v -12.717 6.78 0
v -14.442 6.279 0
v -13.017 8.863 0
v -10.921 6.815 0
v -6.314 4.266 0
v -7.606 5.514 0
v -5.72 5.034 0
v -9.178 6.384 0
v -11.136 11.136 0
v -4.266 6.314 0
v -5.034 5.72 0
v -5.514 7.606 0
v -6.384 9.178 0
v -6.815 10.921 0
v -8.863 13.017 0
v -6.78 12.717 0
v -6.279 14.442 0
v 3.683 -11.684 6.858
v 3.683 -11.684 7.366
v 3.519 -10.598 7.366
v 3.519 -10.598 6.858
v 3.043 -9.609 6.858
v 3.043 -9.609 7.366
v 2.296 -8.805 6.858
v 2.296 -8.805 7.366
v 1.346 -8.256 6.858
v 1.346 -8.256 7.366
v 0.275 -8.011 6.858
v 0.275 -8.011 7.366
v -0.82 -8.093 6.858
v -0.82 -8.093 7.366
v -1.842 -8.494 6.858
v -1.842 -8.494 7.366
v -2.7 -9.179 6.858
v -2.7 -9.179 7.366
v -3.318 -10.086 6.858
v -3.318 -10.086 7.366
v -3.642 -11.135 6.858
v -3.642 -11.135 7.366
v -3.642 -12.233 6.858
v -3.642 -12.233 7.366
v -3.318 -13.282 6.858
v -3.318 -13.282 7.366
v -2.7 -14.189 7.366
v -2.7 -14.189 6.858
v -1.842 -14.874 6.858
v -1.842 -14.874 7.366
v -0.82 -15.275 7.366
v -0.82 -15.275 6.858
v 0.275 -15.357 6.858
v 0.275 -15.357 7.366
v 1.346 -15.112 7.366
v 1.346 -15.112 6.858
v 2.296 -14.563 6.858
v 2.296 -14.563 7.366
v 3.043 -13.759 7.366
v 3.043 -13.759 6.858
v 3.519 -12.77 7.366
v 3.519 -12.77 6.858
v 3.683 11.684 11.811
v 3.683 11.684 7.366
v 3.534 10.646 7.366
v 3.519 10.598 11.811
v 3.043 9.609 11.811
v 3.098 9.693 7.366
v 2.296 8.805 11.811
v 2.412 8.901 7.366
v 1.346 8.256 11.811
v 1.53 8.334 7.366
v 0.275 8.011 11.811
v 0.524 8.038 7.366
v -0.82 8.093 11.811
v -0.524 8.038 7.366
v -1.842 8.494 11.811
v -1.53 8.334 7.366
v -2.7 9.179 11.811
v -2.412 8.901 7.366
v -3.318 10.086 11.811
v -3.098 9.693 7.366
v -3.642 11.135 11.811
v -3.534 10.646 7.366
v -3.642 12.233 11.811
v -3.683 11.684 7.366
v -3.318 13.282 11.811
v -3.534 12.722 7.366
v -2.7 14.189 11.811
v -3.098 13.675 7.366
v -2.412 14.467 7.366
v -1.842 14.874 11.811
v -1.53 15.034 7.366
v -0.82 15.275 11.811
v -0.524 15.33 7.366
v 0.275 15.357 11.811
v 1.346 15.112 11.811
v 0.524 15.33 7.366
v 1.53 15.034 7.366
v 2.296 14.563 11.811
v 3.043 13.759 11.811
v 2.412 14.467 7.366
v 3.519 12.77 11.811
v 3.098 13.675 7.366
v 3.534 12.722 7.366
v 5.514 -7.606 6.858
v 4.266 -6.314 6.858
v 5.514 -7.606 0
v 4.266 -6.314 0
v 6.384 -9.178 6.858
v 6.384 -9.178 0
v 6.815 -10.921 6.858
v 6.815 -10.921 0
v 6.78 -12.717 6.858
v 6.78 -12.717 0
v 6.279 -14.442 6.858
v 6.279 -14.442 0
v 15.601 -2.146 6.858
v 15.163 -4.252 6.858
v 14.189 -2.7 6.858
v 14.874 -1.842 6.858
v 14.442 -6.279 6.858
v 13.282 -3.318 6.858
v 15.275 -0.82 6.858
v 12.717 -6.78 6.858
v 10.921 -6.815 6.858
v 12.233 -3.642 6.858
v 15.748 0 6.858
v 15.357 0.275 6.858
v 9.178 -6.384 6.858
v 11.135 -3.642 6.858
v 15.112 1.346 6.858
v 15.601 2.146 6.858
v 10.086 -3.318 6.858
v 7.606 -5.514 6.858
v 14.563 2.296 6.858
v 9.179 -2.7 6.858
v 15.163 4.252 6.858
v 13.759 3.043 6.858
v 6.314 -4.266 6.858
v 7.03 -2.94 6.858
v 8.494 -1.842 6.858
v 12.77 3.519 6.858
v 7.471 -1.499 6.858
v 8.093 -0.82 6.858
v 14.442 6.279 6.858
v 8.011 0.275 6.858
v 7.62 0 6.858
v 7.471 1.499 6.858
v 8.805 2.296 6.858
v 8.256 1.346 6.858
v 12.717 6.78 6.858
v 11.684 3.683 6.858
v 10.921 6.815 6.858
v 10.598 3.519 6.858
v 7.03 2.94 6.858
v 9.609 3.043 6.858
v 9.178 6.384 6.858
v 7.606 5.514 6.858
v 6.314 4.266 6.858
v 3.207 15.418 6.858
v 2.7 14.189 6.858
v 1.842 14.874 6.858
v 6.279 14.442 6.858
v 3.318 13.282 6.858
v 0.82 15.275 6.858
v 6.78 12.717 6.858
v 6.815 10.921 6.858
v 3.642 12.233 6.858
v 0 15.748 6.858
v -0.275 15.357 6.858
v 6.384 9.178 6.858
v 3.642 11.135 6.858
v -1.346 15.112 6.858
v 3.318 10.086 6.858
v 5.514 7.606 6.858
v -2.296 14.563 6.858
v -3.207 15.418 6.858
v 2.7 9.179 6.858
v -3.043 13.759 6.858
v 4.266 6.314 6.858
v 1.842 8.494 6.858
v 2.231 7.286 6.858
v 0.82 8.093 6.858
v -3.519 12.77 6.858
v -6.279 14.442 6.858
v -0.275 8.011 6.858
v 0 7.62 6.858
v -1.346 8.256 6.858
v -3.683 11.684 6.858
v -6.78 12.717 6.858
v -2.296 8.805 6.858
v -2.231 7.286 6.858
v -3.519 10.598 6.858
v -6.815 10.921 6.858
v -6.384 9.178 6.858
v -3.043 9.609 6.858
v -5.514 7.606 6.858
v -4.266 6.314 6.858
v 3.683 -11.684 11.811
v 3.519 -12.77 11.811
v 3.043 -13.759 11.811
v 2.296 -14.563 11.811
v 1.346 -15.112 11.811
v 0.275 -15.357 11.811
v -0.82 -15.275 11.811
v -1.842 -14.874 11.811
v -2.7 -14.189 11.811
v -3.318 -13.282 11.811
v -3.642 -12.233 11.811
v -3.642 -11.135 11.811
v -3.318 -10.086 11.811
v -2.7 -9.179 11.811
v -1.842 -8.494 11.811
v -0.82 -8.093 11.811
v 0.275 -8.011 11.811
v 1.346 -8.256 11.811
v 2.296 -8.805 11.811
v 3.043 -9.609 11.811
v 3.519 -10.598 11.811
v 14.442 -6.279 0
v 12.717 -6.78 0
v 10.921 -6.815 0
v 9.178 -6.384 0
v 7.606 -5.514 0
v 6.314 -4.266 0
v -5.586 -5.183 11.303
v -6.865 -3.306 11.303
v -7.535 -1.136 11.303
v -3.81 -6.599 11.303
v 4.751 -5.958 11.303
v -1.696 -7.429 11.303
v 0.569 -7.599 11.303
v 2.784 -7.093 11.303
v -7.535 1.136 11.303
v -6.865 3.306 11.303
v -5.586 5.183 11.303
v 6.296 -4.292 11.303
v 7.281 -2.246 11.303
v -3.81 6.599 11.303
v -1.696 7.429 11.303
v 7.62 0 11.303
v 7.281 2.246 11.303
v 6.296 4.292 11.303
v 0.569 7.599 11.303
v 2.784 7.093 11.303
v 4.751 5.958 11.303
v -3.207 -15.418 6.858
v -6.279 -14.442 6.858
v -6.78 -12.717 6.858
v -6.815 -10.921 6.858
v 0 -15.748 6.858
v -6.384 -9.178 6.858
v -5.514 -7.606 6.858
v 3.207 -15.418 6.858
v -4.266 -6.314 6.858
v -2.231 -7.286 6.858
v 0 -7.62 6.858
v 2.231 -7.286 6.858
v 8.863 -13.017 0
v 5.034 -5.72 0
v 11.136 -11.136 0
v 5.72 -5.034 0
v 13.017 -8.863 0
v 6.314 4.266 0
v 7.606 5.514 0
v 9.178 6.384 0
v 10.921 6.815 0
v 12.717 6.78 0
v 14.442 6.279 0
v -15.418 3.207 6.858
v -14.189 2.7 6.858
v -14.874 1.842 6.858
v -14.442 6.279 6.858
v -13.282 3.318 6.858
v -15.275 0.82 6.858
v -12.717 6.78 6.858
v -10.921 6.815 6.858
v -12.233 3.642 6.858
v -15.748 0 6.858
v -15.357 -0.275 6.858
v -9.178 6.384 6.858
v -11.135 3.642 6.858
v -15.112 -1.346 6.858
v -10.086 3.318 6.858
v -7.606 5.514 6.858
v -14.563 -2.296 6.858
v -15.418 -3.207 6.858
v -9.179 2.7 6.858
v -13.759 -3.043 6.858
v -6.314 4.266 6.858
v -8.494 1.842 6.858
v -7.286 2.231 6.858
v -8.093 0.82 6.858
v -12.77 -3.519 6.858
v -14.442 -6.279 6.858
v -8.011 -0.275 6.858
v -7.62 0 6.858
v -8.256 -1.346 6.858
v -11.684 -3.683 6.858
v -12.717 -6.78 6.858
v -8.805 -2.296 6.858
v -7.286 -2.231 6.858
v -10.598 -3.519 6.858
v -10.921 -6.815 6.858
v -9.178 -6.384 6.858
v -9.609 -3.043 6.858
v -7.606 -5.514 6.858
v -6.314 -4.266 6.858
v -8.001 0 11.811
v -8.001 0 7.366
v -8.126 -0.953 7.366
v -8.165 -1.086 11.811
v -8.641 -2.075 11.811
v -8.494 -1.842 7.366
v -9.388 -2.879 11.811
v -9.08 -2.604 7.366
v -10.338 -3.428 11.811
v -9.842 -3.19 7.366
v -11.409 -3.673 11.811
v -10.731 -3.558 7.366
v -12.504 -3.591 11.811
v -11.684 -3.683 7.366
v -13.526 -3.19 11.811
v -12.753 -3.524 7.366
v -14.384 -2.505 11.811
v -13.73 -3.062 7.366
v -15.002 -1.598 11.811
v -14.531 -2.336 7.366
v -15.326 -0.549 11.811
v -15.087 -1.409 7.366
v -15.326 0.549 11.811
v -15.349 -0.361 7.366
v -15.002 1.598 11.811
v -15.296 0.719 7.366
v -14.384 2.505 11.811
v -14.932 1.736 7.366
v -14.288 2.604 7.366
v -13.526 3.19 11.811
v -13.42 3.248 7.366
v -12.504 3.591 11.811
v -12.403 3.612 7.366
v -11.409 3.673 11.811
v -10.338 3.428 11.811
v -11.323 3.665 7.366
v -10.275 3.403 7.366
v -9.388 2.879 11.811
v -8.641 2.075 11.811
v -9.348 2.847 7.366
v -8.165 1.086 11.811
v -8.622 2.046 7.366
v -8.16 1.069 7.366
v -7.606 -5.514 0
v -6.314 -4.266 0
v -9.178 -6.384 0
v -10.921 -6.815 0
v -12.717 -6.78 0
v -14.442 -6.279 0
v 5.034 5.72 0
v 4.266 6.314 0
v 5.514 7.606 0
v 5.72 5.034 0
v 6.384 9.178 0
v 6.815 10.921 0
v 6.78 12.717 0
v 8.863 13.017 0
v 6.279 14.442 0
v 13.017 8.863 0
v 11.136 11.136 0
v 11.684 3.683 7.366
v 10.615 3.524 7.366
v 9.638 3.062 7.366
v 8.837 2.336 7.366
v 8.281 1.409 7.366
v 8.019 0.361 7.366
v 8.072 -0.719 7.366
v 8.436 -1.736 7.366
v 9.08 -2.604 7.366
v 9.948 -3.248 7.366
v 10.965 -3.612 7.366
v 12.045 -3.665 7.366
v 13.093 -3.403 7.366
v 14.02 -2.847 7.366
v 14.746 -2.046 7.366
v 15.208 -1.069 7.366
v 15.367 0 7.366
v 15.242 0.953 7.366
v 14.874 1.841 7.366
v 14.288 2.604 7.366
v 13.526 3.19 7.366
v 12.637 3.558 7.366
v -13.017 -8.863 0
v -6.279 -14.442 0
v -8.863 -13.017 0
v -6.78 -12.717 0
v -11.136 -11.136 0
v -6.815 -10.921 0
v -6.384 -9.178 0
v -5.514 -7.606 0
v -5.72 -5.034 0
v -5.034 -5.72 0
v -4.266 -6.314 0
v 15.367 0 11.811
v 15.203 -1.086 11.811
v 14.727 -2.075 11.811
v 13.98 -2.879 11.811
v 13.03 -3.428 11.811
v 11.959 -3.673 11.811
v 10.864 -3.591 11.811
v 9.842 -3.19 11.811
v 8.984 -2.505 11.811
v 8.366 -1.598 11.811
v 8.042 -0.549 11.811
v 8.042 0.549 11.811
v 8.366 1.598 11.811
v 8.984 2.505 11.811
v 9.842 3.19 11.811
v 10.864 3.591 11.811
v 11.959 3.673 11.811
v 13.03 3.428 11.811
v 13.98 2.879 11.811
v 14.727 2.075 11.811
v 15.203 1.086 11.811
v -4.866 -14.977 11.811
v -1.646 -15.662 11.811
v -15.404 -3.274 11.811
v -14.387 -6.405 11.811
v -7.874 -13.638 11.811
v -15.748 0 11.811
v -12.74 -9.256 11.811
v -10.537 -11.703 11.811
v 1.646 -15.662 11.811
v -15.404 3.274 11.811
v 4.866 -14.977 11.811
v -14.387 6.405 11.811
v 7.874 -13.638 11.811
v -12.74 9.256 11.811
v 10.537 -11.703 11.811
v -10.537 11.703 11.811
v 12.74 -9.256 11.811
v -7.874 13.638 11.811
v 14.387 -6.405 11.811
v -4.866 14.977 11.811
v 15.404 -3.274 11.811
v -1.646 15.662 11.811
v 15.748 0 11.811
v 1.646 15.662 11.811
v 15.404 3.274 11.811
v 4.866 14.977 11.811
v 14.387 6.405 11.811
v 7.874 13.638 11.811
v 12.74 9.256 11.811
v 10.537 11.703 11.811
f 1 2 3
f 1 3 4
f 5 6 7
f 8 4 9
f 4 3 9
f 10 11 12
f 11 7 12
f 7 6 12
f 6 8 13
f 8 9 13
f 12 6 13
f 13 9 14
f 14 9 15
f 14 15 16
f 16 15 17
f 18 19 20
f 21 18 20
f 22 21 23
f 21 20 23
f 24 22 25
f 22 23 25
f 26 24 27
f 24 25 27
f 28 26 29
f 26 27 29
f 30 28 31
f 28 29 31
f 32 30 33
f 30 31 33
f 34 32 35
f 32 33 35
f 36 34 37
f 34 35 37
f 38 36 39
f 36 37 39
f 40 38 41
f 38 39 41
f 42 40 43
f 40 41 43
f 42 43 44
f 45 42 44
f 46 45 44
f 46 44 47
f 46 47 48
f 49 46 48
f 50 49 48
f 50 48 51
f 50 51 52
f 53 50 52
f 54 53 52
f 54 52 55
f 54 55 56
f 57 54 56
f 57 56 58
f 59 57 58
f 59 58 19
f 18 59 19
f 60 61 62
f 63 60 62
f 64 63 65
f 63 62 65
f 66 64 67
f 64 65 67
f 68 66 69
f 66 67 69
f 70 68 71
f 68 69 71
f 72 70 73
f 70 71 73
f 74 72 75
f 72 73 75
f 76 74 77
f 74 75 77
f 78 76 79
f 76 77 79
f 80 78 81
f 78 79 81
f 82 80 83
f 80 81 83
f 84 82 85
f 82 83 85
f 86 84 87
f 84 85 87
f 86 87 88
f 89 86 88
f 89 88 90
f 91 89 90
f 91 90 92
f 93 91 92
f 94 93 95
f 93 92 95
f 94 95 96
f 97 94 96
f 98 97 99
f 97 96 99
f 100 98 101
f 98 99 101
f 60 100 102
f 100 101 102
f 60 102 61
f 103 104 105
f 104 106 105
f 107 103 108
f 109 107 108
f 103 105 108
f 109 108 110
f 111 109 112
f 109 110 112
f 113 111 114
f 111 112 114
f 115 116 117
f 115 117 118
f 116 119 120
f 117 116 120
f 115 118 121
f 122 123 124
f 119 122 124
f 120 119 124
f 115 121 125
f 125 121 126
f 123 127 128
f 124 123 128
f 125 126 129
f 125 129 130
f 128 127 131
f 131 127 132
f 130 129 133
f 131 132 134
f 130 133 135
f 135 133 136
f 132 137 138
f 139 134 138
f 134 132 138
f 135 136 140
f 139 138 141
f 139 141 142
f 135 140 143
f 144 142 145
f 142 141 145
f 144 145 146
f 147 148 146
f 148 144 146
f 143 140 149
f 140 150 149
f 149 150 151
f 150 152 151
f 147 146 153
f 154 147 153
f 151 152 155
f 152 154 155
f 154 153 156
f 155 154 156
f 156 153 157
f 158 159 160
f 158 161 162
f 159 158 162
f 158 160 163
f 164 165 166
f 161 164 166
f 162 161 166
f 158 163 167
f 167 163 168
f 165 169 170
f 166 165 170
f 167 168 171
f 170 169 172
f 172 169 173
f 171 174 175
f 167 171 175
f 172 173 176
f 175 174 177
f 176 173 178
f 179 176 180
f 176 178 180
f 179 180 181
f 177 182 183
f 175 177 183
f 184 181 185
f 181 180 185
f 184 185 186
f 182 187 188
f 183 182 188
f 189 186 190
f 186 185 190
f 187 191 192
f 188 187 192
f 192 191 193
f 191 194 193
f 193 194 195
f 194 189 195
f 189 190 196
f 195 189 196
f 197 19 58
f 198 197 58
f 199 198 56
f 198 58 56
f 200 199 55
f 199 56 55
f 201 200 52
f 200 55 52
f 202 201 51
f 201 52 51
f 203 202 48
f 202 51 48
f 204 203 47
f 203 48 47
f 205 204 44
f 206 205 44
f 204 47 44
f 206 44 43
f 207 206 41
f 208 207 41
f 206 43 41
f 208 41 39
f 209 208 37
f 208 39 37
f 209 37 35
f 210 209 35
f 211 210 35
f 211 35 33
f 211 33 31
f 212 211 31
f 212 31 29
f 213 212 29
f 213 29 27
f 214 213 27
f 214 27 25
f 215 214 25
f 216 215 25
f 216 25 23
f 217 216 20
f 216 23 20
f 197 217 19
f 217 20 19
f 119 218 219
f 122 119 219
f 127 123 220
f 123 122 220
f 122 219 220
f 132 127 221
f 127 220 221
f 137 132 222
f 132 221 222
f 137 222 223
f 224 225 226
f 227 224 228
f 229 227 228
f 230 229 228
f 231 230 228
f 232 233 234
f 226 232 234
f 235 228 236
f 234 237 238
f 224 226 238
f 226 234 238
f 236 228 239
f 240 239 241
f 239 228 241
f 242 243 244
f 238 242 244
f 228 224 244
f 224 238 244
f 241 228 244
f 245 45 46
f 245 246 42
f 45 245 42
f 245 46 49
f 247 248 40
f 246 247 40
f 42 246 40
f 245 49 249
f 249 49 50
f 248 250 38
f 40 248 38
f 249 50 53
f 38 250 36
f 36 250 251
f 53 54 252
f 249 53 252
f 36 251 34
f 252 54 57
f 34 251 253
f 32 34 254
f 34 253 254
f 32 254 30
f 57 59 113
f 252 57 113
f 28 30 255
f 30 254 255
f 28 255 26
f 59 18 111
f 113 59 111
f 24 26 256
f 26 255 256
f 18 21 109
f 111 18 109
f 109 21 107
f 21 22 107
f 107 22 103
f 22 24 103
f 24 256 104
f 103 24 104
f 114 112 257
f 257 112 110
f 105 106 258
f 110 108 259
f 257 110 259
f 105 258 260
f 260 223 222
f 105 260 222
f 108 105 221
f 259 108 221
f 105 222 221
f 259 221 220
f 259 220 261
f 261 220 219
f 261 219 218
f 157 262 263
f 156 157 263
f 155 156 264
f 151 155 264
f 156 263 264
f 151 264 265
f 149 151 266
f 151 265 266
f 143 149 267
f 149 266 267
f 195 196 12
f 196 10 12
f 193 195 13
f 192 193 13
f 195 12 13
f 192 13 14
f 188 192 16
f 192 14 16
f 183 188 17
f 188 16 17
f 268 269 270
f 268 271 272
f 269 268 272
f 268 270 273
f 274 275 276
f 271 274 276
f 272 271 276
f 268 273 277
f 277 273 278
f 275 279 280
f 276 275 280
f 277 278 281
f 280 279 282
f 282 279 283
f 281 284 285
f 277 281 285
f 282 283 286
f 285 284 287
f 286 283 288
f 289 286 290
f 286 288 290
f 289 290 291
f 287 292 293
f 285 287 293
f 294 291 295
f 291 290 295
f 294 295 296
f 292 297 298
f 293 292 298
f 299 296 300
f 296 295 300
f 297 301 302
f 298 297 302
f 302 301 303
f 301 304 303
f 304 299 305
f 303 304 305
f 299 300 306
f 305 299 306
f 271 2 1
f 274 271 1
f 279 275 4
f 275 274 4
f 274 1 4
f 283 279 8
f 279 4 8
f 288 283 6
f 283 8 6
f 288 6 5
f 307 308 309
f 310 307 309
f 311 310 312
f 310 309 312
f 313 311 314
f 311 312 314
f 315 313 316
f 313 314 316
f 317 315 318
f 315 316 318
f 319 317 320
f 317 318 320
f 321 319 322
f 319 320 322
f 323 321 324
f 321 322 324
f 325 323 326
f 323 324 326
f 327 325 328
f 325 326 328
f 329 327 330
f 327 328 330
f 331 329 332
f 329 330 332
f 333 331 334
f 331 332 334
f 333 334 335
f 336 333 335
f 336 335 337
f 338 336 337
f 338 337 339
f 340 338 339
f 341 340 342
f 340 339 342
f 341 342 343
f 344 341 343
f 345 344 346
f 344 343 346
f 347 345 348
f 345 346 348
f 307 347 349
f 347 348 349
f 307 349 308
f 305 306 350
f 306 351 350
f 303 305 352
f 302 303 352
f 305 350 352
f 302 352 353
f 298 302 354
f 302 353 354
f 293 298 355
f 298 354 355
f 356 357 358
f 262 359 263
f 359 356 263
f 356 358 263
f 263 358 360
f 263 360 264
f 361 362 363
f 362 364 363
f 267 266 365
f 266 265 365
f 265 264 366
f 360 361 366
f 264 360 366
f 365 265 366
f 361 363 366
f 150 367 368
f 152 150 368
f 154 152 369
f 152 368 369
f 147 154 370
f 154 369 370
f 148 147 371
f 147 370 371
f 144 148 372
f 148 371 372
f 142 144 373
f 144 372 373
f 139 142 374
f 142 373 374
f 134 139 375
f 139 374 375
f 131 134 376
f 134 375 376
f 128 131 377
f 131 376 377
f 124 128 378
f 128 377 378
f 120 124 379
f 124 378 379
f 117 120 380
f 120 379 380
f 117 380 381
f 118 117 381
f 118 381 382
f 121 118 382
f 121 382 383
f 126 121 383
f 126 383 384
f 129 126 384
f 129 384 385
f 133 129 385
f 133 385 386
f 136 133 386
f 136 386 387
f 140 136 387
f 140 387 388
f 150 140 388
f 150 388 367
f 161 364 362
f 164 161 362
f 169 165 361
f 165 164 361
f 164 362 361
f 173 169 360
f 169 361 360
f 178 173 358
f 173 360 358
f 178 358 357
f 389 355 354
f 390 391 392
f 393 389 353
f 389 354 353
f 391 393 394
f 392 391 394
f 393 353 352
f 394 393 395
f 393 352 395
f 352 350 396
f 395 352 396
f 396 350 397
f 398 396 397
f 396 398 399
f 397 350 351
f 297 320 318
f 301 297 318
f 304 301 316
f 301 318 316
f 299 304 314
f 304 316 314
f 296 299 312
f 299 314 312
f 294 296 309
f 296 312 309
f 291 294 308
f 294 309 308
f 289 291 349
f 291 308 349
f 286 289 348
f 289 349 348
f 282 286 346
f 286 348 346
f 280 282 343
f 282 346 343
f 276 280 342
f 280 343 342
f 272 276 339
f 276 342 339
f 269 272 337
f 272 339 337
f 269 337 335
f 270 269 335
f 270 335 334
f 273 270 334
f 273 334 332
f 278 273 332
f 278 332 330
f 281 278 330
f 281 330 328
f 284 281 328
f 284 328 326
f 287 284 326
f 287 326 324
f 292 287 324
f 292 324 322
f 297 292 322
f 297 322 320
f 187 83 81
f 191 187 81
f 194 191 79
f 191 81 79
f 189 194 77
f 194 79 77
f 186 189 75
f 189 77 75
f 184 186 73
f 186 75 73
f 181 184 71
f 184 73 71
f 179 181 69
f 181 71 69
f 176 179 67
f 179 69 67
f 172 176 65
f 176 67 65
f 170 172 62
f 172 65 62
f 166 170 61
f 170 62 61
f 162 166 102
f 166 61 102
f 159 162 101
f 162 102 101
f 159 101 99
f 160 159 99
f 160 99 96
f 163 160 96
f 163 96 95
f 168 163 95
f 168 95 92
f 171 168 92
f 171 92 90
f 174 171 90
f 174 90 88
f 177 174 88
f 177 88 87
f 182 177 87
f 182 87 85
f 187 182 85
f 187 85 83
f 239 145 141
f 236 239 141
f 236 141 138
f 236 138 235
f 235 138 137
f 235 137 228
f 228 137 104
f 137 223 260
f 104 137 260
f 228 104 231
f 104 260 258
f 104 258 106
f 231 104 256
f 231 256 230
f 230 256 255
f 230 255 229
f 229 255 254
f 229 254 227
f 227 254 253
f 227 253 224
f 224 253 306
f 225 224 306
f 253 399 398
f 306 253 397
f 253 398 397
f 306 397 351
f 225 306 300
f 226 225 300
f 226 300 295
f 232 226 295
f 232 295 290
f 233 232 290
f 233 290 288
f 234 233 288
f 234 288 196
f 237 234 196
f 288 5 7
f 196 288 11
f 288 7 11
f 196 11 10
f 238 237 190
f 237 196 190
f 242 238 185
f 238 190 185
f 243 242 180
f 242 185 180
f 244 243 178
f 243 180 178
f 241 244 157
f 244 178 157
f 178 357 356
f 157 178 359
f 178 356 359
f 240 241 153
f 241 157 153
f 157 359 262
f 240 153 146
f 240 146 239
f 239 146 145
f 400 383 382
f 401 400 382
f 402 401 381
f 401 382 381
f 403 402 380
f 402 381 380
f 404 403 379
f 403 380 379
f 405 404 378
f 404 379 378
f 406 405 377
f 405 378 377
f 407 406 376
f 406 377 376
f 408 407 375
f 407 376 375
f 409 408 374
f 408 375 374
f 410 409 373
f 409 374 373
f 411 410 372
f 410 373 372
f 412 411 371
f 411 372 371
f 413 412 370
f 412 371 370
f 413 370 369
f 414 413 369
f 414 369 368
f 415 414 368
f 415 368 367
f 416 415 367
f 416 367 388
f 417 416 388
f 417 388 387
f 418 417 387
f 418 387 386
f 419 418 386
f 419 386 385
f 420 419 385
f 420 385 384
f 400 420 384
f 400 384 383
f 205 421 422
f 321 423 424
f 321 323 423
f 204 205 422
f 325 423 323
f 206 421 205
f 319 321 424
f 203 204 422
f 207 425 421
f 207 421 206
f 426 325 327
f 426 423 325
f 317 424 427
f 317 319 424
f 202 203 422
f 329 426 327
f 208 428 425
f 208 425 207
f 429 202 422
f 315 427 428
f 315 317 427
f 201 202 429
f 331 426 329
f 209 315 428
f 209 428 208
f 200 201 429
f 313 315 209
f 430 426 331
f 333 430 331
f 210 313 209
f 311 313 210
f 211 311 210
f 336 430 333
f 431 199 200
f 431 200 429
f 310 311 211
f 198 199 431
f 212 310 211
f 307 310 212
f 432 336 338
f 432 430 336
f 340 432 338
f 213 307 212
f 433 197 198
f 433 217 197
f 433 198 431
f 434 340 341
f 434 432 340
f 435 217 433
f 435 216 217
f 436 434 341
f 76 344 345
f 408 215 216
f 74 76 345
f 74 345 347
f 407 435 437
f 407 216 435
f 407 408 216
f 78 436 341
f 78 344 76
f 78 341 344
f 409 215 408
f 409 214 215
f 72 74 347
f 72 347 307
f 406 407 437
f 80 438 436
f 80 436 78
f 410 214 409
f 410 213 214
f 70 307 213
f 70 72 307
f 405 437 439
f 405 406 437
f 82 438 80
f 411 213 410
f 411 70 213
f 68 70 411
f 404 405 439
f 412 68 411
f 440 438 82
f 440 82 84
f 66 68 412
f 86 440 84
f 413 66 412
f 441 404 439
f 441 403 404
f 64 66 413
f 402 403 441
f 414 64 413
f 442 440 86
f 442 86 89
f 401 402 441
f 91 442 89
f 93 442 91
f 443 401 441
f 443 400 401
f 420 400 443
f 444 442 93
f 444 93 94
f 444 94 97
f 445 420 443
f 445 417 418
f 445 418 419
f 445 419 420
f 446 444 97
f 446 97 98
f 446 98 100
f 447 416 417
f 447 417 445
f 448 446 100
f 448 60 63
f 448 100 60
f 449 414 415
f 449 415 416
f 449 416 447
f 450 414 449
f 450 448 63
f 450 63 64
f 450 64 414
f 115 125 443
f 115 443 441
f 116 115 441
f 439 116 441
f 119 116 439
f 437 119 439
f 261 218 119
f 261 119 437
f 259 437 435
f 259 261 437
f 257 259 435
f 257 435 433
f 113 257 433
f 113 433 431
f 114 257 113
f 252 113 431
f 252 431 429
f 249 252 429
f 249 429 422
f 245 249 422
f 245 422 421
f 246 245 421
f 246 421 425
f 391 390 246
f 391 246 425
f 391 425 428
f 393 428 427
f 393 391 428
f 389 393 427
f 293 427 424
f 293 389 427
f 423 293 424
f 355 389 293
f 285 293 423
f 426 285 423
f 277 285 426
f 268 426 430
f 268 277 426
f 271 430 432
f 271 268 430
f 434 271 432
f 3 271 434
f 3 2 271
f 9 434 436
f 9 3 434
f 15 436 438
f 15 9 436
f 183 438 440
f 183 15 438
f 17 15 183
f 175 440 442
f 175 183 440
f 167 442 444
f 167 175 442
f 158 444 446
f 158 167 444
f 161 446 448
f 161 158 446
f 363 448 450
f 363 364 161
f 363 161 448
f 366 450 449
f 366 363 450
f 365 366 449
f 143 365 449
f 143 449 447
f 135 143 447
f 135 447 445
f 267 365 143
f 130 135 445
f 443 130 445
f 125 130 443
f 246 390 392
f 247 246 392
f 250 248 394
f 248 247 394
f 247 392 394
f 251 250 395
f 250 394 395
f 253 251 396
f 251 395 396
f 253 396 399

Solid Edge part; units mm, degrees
sketch "Sketch1" plane through (0, 0, 0) normal (0, 0, 1) x (1, 0, 0)
  circle A0 centre (0, 0) radius 15.748
  circle A1 centre (0, 0) radius 7.62
extrude "Protrusion1" add sketch "Sketch1" along normal blind 7.366
sketch "Sketch2" plane through (0, 0, 0) normal (0, 0, 1) x (1, 0, 0)
  circle A0 centre (0, -11.684) radius 6.858
extrude "ExtrudedCutout_1" cut sketch "Sketch2" along normal blind 6.858
sketch "Sketch3" plane through (0, 0, 7.366) normal (0, 0, 1) x (1, 0, 0)
  circle A0 centre (0, -11.684) radius 3.683
extrude "ExtrudedCutout_4" cut sketch "Sketch3" against normal blind 4.4355
pattern_circular "Pattern1" count 4 over 360 about axis through (0, 0, 7.366) along (0, 0, 1) of "ExtrudedCutout_4", "ExtrudedCutout_1"
sketch "Sketch4" plane through (0, 0, 7.366) normal (0, 0, 1) x (1, 0, 0)
  circle A0 centre (0, 0) radius 15.748
  circle A1 centre (0, -11.684) radius 3.683
  circle A2 centre (0, 0) radius 7.62
  circle A3 centre (-11.684, 0) radius 3.683
  circle A4 centre (0, 11.684) radius 3.683
  circle A5 centre (11.684, 0) radius 3.683
extrude "ExtrudedProtrusion_7" add sketch "Sketch4" along normal blind 10.795
sketch "Sketch5" plane through (0, 0, 18.161) normal (0, 0, 1) x (1, 0, 0)
  circle A0 centre (0, 0) radius 7.62
extrude "ExtrudedProtrusion_8" add sketch "Sketch5" against normal blind 0.508
sketch "Sketch6" plane through (0, 0, 18.161) normal (0, 0, 1) x (1, 0, 0)
  circle A0 centre (0, 0) radius 18.8759
extrude "ExtrudedCutout_5" cut sketch "Sketch6" against normal blind 6.35
sketch "Sketch7" plane through (0, 0, 11.811) normal (0, 0, 1) x (1, 0, 0)
  circle A0 centre (0, 0) radius 7.62
extrude "ExtrudedProtrusion_9" add sketch "Sketch7" against normal blind 0.508
